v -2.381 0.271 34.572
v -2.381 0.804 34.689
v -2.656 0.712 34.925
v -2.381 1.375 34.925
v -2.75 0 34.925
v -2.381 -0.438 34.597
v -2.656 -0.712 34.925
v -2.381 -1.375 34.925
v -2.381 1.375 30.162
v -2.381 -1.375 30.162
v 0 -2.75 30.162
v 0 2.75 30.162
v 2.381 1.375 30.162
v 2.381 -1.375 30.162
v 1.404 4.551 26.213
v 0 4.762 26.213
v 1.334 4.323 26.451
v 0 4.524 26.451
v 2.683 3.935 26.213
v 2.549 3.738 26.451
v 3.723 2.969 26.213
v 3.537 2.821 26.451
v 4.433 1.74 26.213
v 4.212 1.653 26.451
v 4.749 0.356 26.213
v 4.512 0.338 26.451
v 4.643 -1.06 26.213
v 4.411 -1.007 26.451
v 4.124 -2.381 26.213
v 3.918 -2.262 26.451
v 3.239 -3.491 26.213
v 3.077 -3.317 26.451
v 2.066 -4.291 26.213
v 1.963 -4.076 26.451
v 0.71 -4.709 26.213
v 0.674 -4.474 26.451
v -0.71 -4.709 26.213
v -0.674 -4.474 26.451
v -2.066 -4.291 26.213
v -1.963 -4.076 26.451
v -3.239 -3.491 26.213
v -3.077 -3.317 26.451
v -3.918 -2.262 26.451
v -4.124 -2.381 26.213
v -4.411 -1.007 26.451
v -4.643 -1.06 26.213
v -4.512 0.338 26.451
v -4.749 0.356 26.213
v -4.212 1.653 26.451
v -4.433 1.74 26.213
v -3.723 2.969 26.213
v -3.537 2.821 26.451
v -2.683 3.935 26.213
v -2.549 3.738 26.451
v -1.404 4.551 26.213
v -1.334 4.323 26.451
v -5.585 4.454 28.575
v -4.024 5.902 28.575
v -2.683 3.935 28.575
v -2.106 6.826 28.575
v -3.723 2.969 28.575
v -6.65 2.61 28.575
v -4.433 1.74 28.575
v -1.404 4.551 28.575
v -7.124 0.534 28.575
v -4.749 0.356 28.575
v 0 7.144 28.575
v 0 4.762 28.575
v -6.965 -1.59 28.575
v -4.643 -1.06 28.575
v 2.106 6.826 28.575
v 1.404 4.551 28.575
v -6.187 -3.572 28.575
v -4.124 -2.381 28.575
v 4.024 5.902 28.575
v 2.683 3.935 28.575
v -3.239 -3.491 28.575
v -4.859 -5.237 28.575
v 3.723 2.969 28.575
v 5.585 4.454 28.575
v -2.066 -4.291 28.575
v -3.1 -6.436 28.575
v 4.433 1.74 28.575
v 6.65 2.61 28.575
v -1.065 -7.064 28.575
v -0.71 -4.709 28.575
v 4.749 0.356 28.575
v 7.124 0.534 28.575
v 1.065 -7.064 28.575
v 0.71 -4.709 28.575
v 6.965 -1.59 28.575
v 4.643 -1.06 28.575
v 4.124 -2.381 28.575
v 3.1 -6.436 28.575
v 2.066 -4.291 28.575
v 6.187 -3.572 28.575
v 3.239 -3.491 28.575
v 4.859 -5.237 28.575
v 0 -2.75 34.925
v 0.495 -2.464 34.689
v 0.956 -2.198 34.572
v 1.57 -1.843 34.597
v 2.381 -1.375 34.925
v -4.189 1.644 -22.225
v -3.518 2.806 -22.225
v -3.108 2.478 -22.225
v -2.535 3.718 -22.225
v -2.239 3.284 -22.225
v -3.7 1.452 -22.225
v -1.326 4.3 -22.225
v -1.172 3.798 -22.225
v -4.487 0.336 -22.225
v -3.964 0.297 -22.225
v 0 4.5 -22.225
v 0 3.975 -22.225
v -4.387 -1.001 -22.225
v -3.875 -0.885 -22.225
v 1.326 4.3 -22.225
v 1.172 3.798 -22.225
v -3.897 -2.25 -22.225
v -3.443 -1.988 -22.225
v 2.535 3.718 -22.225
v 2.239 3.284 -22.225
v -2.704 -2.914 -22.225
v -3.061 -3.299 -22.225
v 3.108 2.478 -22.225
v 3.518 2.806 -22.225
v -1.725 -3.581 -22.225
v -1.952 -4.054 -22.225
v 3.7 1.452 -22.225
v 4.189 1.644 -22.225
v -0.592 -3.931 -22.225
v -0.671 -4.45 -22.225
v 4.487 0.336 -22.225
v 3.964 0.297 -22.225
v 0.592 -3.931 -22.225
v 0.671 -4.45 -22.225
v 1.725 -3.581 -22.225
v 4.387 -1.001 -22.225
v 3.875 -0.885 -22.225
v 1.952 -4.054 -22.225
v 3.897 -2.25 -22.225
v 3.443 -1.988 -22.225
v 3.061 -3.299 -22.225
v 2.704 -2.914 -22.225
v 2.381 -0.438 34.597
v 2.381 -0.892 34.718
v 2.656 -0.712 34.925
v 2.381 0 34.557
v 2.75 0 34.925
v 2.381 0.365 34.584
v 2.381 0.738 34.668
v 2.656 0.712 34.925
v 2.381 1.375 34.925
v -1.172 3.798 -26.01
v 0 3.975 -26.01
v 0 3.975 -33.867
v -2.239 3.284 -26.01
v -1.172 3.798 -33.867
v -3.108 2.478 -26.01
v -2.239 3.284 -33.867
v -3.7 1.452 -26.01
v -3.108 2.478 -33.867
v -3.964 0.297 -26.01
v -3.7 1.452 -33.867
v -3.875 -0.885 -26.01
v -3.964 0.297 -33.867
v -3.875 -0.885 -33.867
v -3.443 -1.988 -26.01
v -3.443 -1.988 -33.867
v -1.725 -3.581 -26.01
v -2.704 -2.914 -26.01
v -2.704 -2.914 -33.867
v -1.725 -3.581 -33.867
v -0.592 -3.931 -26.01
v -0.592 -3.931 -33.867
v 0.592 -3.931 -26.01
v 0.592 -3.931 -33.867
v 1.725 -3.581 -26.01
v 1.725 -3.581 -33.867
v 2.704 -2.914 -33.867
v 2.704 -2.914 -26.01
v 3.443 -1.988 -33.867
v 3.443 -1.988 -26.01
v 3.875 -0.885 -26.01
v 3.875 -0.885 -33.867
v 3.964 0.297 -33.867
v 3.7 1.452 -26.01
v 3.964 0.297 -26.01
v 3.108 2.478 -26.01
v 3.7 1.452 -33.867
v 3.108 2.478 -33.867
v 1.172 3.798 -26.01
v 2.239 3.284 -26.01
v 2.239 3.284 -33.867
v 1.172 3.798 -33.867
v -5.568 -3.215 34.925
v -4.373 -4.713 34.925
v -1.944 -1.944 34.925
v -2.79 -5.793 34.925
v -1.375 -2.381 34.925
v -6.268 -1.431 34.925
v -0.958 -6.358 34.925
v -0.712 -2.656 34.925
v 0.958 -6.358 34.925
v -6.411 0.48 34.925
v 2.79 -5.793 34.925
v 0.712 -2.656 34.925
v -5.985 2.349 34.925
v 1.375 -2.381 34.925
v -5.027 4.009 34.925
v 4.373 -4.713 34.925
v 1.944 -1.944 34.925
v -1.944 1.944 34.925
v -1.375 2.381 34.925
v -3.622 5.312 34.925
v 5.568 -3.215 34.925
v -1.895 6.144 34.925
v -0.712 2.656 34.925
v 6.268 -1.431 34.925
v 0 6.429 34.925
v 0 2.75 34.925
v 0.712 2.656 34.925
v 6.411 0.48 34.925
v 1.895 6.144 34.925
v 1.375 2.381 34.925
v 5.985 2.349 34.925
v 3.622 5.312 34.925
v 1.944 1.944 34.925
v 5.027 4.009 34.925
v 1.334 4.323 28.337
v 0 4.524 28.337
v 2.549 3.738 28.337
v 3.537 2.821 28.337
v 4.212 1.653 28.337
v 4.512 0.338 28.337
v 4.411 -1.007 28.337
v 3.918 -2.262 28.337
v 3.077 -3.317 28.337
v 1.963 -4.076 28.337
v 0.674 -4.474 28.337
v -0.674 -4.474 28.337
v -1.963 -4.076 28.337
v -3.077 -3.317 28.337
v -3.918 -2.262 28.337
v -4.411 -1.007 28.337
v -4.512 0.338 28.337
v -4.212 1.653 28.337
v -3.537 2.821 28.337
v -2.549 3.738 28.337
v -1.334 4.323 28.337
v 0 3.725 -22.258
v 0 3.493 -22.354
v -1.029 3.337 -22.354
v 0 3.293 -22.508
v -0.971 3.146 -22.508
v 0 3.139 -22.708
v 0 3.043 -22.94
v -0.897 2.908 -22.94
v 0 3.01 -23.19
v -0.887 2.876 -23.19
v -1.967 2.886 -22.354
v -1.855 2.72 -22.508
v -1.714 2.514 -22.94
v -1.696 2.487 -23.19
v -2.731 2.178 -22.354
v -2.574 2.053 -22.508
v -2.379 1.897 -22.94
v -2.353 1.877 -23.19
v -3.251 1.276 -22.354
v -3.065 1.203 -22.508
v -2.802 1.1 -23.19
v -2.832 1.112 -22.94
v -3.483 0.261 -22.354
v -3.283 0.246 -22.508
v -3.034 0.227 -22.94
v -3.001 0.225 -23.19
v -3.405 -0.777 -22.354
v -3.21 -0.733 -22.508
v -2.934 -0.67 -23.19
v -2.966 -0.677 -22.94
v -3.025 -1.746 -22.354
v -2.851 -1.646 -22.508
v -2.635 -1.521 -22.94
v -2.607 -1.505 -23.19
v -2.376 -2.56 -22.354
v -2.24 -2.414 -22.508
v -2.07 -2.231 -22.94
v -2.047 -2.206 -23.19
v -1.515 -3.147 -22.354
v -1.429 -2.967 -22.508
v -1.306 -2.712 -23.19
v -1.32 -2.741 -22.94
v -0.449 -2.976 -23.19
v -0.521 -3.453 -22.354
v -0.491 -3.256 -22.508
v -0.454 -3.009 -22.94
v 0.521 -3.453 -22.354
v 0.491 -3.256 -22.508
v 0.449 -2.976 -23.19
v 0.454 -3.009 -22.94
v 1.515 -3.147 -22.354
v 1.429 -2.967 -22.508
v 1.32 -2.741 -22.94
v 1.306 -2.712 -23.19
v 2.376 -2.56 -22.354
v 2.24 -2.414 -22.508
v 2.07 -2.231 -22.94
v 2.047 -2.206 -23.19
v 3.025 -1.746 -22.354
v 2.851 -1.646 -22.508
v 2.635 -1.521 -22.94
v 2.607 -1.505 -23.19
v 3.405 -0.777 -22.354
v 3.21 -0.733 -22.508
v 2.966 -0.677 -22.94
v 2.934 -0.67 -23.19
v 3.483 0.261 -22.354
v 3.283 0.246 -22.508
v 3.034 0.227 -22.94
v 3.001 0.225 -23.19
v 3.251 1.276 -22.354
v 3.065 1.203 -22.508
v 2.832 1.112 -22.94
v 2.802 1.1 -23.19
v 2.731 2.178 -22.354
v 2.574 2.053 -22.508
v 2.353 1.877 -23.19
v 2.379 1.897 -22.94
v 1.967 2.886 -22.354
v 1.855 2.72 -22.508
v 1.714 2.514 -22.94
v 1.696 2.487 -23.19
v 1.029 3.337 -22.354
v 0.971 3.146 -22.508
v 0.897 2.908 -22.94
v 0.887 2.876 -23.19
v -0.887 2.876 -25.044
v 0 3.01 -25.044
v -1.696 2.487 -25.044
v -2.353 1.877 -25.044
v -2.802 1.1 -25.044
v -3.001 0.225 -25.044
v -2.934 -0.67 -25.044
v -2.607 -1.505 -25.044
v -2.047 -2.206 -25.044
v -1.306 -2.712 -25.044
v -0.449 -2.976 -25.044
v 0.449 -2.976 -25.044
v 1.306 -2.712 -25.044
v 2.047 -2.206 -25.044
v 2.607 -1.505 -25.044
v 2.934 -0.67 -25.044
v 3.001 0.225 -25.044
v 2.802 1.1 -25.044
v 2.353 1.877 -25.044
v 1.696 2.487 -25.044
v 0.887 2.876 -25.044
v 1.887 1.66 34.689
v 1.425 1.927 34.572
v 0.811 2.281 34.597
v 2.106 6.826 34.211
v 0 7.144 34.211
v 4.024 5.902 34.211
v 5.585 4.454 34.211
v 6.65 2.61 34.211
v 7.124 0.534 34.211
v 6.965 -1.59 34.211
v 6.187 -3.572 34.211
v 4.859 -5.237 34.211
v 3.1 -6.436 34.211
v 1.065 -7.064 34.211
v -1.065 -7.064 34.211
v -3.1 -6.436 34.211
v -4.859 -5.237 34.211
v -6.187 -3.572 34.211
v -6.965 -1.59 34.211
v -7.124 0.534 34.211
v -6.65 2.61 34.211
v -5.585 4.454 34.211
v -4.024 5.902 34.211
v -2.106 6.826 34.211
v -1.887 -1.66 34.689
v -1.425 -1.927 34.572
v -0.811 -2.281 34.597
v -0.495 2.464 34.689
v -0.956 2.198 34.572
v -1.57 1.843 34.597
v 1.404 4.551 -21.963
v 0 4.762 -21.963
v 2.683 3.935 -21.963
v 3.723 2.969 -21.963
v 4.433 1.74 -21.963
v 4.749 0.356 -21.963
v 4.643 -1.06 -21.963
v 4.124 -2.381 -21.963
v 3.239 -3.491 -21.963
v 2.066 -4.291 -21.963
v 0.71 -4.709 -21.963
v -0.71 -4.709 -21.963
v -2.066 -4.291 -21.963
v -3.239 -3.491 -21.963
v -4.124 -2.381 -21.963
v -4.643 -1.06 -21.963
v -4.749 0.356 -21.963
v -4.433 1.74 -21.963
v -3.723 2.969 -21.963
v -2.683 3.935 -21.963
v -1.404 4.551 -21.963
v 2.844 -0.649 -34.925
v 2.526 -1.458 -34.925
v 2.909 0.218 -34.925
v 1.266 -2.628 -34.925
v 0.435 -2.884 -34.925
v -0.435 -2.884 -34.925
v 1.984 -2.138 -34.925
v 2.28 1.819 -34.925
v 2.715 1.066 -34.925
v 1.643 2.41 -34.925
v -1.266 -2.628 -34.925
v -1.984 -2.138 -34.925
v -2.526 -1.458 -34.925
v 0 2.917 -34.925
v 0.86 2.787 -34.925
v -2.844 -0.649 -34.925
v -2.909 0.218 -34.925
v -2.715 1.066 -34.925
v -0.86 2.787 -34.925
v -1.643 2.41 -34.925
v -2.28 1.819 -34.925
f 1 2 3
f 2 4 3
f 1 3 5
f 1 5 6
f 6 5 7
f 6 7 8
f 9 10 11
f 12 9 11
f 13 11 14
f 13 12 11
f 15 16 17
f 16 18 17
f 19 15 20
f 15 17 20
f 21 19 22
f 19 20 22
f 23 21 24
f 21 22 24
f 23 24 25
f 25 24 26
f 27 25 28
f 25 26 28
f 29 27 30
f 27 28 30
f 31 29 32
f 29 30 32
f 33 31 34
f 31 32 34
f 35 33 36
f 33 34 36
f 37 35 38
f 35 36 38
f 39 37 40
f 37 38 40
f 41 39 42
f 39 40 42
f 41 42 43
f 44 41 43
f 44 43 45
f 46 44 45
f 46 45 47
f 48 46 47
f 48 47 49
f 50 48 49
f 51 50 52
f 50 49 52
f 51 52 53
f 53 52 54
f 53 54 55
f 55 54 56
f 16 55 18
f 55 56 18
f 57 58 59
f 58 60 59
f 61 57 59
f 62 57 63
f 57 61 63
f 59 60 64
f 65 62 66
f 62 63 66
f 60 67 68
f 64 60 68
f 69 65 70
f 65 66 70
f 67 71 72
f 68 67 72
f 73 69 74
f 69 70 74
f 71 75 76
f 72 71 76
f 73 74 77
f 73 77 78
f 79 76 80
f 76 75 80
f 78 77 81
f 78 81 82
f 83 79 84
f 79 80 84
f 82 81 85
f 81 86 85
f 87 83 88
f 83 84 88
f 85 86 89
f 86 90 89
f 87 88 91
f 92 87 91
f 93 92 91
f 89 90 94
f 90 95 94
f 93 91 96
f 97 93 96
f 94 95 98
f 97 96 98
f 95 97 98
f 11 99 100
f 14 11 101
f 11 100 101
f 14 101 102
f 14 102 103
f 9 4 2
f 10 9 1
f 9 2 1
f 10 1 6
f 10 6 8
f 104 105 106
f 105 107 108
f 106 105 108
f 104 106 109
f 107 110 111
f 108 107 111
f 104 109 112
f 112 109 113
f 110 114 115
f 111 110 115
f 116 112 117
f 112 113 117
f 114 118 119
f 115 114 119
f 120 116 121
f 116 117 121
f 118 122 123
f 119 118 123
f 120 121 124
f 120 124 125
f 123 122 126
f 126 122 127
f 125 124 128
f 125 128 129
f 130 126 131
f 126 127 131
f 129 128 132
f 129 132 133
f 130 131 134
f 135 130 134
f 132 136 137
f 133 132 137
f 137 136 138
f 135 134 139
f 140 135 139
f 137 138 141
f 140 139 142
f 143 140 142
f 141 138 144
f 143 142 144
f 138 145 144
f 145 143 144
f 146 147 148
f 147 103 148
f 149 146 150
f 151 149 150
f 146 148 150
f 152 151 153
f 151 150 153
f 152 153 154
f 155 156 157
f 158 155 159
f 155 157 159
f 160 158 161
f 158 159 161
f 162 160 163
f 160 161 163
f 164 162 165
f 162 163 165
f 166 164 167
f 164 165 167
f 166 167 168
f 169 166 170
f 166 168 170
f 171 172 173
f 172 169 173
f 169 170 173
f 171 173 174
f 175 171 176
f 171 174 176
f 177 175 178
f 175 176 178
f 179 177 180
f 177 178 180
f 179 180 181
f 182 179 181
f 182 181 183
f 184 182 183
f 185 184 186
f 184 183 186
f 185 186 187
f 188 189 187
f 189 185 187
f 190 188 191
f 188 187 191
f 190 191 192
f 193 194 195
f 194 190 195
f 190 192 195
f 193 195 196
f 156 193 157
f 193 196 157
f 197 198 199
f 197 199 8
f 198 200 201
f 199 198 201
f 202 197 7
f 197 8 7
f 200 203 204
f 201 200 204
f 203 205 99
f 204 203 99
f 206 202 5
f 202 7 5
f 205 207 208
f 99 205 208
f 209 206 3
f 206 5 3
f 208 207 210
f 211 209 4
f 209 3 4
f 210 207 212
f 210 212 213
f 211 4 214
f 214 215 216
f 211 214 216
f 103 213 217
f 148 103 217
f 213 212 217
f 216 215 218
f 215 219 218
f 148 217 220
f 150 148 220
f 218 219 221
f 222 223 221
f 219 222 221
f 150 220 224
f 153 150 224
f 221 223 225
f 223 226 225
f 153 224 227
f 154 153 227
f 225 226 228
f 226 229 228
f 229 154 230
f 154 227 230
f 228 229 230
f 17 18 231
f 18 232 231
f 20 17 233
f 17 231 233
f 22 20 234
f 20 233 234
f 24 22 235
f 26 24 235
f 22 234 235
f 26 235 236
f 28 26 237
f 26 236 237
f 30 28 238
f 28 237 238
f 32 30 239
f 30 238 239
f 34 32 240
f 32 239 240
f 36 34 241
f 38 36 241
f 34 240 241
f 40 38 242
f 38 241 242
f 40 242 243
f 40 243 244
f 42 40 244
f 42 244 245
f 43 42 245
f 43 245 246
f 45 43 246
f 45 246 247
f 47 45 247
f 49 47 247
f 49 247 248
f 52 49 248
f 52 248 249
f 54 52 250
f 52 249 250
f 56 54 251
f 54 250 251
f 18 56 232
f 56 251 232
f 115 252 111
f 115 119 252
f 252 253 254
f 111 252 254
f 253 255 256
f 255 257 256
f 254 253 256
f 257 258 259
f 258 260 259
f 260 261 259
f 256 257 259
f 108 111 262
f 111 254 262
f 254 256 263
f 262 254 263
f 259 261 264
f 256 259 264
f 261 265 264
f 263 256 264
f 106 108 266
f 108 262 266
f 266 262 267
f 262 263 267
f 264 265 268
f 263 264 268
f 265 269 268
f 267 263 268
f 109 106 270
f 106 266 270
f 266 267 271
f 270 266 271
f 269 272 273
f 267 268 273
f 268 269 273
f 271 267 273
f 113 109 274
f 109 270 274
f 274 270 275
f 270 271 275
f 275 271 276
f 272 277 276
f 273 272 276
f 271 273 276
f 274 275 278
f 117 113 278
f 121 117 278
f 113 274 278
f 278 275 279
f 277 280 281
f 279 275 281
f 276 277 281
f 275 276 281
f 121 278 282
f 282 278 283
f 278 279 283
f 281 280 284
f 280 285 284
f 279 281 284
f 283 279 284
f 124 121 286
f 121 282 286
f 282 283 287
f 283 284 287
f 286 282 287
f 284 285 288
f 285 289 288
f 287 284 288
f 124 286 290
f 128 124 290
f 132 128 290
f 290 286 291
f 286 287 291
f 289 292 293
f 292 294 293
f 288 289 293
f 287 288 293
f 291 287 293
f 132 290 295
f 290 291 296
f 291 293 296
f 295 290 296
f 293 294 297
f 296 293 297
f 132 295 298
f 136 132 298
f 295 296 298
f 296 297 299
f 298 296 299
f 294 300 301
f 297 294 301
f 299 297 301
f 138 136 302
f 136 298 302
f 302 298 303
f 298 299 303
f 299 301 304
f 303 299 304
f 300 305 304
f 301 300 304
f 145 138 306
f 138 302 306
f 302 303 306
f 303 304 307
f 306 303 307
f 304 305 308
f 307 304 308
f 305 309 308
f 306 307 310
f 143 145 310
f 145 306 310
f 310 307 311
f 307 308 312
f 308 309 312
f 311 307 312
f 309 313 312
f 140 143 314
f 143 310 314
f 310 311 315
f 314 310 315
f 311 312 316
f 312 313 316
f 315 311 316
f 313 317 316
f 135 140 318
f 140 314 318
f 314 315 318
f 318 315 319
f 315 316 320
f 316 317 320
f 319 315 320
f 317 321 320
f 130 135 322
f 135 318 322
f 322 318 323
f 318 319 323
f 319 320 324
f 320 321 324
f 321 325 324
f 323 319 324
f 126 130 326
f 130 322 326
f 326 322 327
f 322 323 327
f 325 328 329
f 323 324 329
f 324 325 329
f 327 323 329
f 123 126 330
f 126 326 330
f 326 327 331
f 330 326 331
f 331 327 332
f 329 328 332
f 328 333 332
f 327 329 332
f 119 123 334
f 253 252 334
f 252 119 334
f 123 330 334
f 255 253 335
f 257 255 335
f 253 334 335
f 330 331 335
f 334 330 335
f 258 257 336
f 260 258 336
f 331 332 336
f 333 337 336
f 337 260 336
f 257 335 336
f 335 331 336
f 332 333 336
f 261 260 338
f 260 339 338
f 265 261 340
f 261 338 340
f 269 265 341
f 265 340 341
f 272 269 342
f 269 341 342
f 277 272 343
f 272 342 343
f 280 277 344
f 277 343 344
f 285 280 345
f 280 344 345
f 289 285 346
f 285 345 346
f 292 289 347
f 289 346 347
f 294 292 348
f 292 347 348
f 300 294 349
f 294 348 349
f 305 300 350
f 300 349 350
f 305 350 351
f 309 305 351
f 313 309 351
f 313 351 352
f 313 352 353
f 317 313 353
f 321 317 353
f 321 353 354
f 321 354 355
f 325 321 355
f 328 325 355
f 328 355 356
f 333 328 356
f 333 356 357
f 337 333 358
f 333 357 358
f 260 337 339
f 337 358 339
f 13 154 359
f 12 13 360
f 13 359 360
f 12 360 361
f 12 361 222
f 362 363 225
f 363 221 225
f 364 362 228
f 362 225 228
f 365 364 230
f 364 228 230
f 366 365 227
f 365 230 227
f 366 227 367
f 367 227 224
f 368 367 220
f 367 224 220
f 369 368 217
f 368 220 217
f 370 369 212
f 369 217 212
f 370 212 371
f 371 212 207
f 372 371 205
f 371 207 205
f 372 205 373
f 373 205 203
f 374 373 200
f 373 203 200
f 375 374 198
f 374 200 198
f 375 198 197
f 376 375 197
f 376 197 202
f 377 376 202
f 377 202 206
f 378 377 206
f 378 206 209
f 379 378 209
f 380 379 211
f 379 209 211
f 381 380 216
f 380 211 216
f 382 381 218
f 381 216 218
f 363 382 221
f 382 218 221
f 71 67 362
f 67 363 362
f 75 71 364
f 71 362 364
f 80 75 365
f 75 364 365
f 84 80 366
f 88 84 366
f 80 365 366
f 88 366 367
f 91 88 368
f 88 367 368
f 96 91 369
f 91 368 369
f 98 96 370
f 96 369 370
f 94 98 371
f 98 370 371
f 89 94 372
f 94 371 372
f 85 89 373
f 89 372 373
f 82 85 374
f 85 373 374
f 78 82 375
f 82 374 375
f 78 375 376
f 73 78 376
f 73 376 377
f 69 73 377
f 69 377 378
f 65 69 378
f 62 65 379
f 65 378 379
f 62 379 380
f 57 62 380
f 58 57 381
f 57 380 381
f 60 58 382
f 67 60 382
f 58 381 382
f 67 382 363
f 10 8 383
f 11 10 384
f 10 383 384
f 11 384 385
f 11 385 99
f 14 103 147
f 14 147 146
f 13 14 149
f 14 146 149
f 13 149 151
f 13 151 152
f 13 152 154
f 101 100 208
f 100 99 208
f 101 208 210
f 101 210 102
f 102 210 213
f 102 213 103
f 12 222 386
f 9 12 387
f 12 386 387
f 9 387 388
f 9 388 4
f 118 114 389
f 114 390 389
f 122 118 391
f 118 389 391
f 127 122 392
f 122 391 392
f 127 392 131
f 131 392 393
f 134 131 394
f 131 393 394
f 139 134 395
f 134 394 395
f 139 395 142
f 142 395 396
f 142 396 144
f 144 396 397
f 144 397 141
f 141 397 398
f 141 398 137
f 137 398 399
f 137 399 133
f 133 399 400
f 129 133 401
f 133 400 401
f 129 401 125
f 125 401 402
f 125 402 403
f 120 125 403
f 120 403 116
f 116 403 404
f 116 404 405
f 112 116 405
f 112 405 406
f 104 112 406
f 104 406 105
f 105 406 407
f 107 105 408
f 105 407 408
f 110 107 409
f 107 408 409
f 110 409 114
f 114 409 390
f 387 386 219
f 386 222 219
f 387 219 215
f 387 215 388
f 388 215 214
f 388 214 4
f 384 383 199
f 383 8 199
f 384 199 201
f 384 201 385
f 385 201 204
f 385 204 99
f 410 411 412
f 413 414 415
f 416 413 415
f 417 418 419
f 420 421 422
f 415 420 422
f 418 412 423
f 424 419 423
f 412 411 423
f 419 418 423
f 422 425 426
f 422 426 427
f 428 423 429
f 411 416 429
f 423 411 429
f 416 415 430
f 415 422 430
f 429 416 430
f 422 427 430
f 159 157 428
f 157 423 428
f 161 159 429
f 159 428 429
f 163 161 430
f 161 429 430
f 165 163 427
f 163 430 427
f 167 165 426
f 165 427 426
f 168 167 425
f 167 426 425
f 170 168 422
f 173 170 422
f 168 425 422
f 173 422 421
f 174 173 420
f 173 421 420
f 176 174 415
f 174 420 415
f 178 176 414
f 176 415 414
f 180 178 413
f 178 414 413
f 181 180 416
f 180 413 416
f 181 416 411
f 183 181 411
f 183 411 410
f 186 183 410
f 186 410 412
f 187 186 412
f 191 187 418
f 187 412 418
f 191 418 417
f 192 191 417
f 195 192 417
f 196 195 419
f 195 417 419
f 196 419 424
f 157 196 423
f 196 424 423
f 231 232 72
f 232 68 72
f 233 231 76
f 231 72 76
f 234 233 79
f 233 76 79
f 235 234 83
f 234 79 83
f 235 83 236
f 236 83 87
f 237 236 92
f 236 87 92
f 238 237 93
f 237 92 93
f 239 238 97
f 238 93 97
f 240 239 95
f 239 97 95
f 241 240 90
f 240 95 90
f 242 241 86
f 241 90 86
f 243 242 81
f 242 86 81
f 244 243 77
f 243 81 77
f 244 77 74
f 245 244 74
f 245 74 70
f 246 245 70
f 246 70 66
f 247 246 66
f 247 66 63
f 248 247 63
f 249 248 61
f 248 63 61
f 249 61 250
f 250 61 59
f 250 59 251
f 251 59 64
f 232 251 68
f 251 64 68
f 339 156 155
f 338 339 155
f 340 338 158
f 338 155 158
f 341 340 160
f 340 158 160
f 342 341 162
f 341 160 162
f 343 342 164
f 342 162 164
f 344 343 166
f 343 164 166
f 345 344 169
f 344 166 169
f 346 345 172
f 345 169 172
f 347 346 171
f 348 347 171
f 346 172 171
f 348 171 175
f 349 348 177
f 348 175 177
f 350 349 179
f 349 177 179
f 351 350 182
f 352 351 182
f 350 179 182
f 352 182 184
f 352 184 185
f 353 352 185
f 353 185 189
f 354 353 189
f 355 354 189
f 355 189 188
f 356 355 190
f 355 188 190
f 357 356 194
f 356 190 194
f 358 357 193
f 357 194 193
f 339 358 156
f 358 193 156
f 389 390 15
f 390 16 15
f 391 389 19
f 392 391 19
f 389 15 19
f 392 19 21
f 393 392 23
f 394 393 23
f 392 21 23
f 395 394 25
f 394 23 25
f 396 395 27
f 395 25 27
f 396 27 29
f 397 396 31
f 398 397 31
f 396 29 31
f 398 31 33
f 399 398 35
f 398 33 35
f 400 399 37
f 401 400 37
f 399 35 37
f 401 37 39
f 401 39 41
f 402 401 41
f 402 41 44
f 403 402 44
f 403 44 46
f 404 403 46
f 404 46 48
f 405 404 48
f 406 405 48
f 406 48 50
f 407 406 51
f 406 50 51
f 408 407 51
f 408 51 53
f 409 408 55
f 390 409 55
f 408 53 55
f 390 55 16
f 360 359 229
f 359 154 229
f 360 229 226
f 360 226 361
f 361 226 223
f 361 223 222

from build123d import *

# Parameters (mm, degrees)
CUT_EXTRUDE1_DEPTH = 4.7625


with BuildPart() as part:
    # Sketch4 → Revolve1 (revolve)
    with BuildSketch(Plane(origin=(0, 0, 0), x_dir=(0, 0, -1), z_dir=(1, 0, 0))):
        Polygon((-28.575, 7.14375), (-34.210625, 7.14375), (-34.925, 6.429375), (-34.925, 0), (22.225, 0), (22.225, 4.500033333), (21.962533333, 4.7625), (-26.2128, 4.7625), (-26.450925, 4.524375), (-28.336875, 4.524375), (-28.575, 4.7625), align=None)
    revolve(axis=Axis((0, 0, 34.925), (0, 0, -1)))

    # Sketch5 → Cut-Extrude1 (cut)
    with BuildSketch(Plane.XY.offset(34.925)):
        Polygon((2.38125, 1.374815329), (0, 2.749630657), (-2.38125, 1.374815329), (-2.38125, -1.374815329), (0, -2.749630657), (2.38125, -1.374815329), align=None)
    extrude(amount=-CUT_EXTRUDE1_DEPTH, mode=Mode.SUBTRACT)

    # Cut-Extrude4 cone 1 section (through the dimple's axis) → Cut-Extrude4 (revolve, cut)
    with BuildSketch(Plane(origin=(0, 0, 34.925), x_dir=(0, -1, 0), z_dir=(1, 0, 0))):
        Polygon((0, 0), (2.749630657, 0), (0, 2.749630657), align=None)
    revolve(axis=Axis((0, 0, 34.925), (0, 0, -1)), mode=Mode.SUBTRACT)

    # Sketch7 → Revolve2 (revolve)
    with BuildSketch(Plane(origin=(0, 0, 0), x_dir=(0, 0, -1), z_dir=(1, 0, 0))):
        Polygon((22.225, 3.9751), (33.866666667, 3.9751), (34.925, 2.916766667), (34.925, 0), (22.225, 0), align=None)
    revolve(axis=Axis((0, 0, -34.925), (0, 0, 1)))

    # Sketch10 → Cut-Revolve1 (revolve, cut)
    with BuildSketch(Plane(origin=(0, 0, 0), x_dir=(0, 0, -1), z_dir=(1, 0, 0))):
        with BuildLine():
            Line((23.1902, 3.0099), (25.0444, 3.0099))
            Line((25.0444, 3.0099), (26.797, 4.7625))
            Line((26.797, 4.7625), (22.225, 4.7625))
            Line((22.225, 4.7625), (22.225, 3.9751))
            ThreePointArc((22.225, 3.9751), (22.507700535, 3.292600535), (23.1902, 3.0099))
        make_face()
    revolve(axis=Axis((0, 0, -34.925), (0, 0, 1)), mode=Mode.SUBTRACT)


solid = part.part
